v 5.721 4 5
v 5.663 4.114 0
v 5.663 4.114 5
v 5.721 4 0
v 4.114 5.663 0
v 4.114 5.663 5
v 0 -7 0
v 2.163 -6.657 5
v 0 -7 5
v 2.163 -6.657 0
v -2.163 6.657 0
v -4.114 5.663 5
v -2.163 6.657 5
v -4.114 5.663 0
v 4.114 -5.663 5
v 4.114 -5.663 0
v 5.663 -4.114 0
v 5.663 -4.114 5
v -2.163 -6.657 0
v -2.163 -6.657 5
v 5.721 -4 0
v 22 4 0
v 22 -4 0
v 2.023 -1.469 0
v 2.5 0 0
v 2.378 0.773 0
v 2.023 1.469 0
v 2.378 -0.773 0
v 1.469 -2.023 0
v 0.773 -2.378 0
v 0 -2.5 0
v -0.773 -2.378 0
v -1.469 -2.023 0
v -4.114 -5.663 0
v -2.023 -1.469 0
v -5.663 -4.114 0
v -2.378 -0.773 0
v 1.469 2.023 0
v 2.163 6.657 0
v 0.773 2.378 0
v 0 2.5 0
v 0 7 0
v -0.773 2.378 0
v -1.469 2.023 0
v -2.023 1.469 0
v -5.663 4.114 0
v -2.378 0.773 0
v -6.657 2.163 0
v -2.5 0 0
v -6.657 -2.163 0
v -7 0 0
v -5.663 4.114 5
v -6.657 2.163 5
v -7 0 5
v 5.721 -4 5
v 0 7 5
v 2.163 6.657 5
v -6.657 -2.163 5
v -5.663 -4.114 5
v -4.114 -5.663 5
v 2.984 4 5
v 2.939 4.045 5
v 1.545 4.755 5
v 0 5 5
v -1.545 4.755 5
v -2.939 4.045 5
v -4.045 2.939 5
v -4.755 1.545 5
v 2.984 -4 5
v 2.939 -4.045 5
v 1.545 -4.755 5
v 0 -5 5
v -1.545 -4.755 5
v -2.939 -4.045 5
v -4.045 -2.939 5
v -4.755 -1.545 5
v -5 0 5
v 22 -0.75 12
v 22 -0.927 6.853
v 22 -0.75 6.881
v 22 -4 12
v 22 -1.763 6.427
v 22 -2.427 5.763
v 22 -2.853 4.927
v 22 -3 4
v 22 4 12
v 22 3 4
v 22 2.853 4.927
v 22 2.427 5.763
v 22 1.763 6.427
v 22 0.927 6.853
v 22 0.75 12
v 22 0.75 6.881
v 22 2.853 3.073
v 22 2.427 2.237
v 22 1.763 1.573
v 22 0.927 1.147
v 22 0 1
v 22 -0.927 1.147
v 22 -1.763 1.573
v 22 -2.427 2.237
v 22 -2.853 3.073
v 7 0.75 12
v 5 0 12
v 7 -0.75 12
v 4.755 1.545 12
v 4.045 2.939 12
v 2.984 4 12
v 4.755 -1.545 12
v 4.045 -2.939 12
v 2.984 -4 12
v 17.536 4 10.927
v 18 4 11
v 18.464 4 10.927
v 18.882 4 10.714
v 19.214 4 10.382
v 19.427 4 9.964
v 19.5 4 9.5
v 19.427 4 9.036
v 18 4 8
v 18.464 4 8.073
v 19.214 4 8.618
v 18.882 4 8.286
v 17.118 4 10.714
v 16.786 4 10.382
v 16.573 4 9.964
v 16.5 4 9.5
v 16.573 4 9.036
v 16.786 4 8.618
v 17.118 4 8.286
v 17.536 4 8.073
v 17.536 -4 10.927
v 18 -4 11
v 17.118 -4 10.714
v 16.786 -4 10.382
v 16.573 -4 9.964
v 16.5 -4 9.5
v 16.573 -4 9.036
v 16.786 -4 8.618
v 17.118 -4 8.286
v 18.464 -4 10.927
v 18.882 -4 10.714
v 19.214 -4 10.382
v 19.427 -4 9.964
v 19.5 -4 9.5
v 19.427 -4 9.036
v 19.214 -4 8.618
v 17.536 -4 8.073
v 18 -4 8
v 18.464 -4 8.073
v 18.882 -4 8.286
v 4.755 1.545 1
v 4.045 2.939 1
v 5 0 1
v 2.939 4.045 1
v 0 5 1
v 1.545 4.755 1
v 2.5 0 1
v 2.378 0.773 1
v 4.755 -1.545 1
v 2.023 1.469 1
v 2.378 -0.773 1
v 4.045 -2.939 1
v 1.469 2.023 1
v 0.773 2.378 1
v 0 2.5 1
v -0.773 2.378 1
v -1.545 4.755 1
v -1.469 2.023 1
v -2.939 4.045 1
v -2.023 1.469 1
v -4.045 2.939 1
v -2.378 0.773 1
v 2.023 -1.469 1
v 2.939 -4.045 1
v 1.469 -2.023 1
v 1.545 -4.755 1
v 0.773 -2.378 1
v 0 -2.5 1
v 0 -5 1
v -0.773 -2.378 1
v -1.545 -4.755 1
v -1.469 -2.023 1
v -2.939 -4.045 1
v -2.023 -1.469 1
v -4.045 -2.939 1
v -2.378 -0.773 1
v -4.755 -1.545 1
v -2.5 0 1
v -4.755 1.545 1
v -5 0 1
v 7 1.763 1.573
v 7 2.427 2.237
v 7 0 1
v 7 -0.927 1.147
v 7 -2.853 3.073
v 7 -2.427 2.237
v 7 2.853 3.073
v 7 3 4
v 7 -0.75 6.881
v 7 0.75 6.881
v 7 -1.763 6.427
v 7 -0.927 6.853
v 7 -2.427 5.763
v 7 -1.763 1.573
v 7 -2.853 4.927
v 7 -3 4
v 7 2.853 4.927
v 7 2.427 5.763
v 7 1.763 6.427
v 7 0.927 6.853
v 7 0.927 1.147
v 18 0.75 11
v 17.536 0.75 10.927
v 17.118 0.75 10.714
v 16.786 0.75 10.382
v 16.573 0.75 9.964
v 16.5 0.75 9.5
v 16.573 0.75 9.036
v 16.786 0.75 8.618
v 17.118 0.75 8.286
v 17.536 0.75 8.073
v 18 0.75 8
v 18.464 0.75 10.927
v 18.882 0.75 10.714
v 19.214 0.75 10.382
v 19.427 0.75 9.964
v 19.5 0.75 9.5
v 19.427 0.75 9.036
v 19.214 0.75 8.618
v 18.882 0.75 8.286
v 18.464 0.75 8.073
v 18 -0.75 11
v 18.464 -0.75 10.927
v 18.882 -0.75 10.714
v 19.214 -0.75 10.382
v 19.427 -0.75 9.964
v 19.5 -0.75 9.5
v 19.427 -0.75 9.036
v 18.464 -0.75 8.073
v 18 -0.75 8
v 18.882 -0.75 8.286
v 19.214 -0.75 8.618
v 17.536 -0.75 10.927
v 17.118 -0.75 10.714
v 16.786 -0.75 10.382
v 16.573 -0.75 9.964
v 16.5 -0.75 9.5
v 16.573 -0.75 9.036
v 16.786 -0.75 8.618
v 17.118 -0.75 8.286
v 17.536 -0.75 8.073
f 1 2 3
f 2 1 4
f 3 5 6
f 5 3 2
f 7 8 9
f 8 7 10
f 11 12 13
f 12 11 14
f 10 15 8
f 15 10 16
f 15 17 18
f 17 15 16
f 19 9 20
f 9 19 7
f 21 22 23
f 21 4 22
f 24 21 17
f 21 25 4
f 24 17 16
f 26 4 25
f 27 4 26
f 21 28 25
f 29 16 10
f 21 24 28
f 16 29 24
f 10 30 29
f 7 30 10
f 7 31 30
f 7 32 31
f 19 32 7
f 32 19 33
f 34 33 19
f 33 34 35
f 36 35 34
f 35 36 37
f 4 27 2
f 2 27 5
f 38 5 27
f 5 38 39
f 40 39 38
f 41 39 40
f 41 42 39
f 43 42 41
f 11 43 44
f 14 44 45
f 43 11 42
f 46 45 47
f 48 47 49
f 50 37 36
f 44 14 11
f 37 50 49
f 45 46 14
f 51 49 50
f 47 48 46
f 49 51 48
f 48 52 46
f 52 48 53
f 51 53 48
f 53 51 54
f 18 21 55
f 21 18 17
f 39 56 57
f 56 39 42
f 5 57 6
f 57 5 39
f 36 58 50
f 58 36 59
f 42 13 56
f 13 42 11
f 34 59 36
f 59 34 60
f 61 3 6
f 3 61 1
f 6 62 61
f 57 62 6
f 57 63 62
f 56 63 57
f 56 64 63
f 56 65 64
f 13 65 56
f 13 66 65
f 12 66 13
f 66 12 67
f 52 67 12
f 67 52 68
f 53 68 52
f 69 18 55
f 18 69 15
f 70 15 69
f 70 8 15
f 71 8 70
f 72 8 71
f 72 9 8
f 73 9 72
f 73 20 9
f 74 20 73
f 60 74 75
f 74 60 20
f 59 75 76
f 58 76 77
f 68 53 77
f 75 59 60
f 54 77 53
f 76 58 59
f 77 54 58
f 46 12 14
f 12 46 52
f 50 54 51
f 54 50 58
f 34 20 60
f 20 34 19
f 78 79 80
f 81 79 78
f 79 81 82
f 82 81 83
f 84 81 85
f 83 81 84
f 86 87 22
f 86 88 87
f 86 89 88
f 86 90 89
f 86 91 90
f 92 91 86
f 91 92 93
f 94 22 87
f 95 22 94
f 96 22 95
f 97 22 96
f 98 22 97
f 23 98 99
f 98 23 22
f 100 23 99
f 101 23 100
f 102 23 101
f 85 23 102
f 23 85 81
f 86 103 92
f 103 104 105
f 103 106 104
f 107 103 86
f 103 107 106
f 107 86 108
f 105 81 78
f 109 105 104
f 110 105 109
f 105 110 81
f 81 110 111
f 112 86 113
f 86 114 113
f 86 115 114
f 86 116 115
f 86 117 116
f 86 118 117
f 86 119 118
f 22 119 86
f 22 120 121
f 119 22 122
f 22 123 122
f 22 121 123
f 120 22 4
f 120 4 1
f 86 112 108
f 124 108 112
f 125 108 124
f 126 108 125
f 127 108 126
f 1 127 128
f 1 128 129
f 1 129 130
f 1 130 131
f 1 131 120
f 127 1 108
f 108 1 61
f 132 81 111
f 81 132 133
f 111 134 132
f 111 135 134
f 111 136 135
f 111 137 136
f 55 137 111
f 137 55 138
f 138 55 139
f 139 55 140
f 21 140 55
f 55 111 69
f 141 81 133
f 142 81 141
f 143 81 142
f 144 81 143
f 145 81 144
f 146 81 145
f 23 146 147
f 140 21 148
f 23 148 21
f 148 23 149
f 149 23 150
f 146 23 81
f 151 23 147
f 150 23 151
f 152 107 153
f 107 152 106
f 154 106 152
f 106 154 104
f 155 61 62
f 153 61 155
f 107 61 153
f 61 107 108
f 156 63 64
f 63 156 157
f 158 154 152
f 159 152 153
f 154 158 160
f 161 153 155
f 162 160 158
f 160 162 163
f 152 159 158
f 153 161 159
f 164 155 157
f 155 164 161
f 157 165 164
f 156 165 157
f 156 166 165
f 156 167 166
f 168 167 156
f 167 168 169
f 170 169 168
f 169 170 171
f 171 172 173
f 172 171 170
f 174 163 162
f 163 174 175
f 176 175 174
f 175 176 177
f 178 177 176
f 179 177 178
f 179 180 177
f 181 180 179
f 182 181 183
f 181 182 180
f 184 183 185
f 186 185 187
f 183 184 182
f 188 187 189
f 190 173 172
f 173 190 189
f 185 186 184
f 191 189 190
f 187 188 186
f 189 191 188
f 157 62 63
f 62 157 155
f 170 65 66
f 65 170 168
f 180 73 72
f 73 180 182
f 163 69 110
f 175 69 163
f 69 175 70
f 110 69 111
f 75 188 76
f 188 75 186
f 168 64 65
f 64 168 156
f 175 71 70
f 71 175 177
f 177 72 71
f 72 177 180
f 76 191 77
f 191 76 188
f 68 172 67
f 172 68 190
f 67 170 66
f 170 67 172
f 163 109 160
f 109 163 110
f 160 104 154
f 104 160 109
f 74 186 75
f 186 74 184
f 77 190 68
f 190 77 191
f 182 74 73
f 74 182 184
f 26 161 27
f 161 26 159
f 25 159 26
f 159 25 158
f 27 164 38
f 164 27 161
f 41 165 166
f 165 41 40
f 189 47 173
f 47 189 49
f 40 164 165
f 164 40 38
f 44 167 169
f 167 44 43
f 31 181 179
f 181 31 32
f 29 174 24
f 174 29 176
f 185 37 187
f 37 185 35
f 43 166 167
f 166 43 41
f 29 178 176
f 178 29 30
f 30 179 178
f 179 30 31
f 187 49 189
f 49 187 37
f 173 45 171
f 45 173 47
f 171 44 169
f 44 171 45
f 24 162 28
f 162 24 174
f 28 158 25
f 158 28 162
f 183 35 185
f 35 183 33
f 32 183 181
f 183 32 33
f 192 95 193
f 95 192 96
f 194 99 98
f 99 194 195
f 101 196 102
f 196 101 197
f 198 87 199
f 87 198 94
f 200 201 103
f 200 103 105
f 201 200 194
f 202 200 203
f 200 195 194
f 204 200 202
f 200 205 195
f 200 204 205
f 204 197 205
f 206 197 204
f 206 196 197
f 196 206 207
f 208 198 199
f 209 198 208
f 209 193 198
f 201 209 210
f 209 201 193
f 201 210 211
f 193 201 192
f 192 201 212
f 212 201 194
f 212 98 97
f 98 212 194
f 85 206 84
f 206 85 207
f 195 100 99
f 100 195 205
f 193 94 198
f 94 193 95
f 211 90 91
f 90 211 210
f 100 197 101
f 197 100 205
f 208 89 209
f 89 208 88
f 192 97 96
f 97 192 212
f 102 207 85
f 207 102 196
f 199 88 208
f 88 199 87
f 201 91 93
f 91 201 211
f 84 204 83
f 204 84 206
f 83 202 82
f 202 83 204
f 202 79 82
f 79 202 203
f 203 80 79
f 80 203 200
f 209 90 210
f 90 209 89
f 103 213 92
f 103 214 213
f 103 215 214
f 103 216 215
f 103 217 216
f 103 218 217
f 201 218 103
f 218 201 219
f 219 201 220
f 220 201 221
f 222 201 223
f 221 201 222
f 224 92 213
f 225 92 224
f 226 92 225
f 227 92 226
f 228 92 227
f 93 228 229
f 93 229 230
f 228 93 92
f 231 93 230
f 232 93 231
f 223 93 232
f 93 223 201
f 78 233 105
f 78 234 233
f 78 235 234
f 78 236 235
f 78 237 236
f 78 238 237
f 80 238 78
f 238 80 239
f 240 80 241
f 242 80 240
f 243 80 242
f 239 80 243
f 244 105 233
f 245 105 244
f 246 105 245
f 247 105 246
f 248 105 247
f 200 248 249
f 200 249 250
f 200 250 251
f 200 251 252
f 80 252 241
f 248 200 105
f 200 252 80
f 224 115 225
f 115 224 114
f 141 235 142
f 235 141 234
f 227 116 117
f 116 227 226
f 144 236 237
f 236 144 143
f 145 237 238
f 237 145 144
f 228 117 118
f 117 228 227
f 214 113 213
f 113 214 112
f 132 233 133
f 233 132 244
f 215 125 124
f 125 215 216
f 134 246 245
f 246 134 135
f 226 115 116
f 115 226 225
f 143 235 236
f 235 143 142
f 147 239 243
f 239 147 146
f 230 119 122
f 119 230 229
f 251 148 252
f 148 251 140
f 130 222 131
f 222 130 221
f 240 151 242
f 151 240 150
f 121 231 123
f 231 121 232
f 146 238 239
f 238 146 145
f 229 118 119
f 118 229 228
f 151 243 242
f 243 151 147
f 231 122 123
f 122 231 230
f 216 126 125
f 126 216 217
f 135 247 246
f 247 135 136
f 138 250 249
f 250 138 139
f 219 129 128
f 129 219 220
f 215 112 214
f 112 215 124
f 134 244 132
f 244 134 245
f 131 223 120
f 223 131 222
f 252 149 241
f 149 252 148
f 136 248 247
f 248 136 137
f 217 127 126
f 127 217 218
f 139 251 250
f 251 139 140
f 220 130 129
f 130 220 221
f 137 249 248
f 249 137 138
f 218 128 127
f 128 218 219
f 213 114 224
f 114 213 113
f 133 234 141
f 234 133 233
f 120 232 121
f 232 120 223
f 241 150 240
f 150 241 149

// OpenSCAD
detail = 20;	//20=low, 80=high
height = 15;
barLength = 40;
holeDiam = 8;	//M8 bolt
ledgeThick = 2.5;
shaftDiam = 6;
shaftPos = height/3;
shaftClampedLength = 15;
shaftPad = 1;

layer = 0.2;

m5bolt = 5;
m3bolt = 3;
bearingDiam = 10;
bearingThick = 4;
bearingPad = 2;         //padding around the outside of the bearing outer
bearingMarg = 1;        //thickness under the ends of the bearing

tiny=0.001;

elbowBearing();

module elbow() {
    
}

module elbowBearing() {
    difference() {
        //main body (bearing housing + shaft clamp)
        union() {
            cylinder(h=bearingThick+bearingMarg,d=bearingDiam+2*bearingPad,$fn=detail);
            translate([0,-(shaftDiam+shaftPad*2)/2,0])cube([bearingPad+shaftClampedLength+bearingDiam/2,shaftDiam+shaftPad*2,shaftPad+m3bolt+shaftDiam+shaftPad*2]);
        }
        //remove bearing
        translate([0,0,bearingMarg])cylinder(h=m3bolt+shaftDiam+shaftPad*2,d=bearingDiam,$fn=detail);
        //bolt hole
        cylinder(h=bearingThick,d=m5bolt,$fn=detail);
        //shaft
        translate([bearingPad+bearingDiam/2,0,shaftPad+shaftDiam/2])rotate([0,90,0])cylinder(h=shaftClampedLength,d=shaftDiam,$fn=detail);
        //keyway for clamping
        translate([bearingPad+bearingDiam/2,-shaftDiam/8,shaftPad+shaftDiam/2])cube([bearingDiam/2+shaftClampedLength,shaftDiam/4,shaftDiam*2]);
        //clamp bolt
        #translate([shaftClampedLength+bearingDiam/2-bearingPad,tiny/2+shaftPad+shaftDiam/2,shaftPad*2+shaftDiam+m3bolt/2])rotate([90,0,0])cylinder(h=tiny+shaftDiam+2*shaftPad,d=m3bolt,$fn=detail);
    }
}


module shaftMount() {
	difference() {
		union() {
			cylinder(h=height,d=holeDiam*2,$fn=detail);
			translate([0,-holeDiam,0])cube([barLength,holeDiam*2,height]);
		}
		cylinder(h=height,d=holeDiam,$fn=detail);
		translate([holeDiam,0,shaftPos])rotate([0,90,0]) {
			cylinder(h=barLength,d=shaftDiam,$fn=detail);
			translate([-height,-shaftDiam/4,0])cube([height,shaftDiam/2,barLength]);
		}
		#translate([barLength-holeDiam,holeDiam-4.5,1.5+shaftPos+shaftDiam/2])rotate([90,0,0])boltHoleNut(7,5.7,12,3.5);
	}
	
}

module elbow1() {
	difference() {
		union() {
			cylinder(h=height,d=holeDiam*2,$fn=detail);
			translate([0,-holeDiam,0])cube([barLength,holeDiam*2,height]);
		}
		cylinder(h=height,d=m5bolt,$fn=detail);
		translate([0,0,height/2-0.5])cylinder(h=height,d=holeDiam*2+1,$fn=detail);	//assumes 1mm washer
		translate([0,0,height/2-0.5-bearingThick])cylinder(h=bearingThick,d=bearingDiam,$fn=detail);	//assumes 1mm washer
		translate([holeDiam,0,shaftPos])rotate([0,90,0]) {
			cylinder(h=barLength,d=shaftDiam,$fn=detail);
			translate([-height,-shaftDiam/4,0])cube([height,shaftDiam/2,barLength]);
		}
		#translate([barLength-holeDiam,holeDiam-4.5,1.5+shaftPos+shaftDiam/2])rotate([90,0,0])boltHoleNut(7,5.7,12,3.5);
	}
}



module boltHole(headLength, headDiam, shaftLength, shaftDiam) {
 	//(M3)
	//head length std = 3mm
	//head diameter std = 5.5mm
	//shaft diameter std = 3mm
	//length defined
	union() {
		cylinder(h=shaftLength,d=shaftDiam,$fn=detail);
		translate([0,0,-headLength]) cylinder(h=headLength,d=headDiam,$fn=detail); //h=2.9
	}
}

module boltHoleNut(headLength, headDiam, shaftLength, shaftDiam) {
 	//(M3)
	//head length std = 3mm
	//head diameter std = 5.5mm
	//shaft diameter std = 3mm
	//length defined
	union() {
		cylinder(h=shaftLength,d=shaftDiam,$fn=detail);
		translate([0,0,-headLength]) cylinder(h=headLength,d=headDiam,$fn=detail); //h=2.9
		translate([0,0,shaftLength-2.4])cylinder(h=2.4,d=6.5,$fn=6);
	}
}
